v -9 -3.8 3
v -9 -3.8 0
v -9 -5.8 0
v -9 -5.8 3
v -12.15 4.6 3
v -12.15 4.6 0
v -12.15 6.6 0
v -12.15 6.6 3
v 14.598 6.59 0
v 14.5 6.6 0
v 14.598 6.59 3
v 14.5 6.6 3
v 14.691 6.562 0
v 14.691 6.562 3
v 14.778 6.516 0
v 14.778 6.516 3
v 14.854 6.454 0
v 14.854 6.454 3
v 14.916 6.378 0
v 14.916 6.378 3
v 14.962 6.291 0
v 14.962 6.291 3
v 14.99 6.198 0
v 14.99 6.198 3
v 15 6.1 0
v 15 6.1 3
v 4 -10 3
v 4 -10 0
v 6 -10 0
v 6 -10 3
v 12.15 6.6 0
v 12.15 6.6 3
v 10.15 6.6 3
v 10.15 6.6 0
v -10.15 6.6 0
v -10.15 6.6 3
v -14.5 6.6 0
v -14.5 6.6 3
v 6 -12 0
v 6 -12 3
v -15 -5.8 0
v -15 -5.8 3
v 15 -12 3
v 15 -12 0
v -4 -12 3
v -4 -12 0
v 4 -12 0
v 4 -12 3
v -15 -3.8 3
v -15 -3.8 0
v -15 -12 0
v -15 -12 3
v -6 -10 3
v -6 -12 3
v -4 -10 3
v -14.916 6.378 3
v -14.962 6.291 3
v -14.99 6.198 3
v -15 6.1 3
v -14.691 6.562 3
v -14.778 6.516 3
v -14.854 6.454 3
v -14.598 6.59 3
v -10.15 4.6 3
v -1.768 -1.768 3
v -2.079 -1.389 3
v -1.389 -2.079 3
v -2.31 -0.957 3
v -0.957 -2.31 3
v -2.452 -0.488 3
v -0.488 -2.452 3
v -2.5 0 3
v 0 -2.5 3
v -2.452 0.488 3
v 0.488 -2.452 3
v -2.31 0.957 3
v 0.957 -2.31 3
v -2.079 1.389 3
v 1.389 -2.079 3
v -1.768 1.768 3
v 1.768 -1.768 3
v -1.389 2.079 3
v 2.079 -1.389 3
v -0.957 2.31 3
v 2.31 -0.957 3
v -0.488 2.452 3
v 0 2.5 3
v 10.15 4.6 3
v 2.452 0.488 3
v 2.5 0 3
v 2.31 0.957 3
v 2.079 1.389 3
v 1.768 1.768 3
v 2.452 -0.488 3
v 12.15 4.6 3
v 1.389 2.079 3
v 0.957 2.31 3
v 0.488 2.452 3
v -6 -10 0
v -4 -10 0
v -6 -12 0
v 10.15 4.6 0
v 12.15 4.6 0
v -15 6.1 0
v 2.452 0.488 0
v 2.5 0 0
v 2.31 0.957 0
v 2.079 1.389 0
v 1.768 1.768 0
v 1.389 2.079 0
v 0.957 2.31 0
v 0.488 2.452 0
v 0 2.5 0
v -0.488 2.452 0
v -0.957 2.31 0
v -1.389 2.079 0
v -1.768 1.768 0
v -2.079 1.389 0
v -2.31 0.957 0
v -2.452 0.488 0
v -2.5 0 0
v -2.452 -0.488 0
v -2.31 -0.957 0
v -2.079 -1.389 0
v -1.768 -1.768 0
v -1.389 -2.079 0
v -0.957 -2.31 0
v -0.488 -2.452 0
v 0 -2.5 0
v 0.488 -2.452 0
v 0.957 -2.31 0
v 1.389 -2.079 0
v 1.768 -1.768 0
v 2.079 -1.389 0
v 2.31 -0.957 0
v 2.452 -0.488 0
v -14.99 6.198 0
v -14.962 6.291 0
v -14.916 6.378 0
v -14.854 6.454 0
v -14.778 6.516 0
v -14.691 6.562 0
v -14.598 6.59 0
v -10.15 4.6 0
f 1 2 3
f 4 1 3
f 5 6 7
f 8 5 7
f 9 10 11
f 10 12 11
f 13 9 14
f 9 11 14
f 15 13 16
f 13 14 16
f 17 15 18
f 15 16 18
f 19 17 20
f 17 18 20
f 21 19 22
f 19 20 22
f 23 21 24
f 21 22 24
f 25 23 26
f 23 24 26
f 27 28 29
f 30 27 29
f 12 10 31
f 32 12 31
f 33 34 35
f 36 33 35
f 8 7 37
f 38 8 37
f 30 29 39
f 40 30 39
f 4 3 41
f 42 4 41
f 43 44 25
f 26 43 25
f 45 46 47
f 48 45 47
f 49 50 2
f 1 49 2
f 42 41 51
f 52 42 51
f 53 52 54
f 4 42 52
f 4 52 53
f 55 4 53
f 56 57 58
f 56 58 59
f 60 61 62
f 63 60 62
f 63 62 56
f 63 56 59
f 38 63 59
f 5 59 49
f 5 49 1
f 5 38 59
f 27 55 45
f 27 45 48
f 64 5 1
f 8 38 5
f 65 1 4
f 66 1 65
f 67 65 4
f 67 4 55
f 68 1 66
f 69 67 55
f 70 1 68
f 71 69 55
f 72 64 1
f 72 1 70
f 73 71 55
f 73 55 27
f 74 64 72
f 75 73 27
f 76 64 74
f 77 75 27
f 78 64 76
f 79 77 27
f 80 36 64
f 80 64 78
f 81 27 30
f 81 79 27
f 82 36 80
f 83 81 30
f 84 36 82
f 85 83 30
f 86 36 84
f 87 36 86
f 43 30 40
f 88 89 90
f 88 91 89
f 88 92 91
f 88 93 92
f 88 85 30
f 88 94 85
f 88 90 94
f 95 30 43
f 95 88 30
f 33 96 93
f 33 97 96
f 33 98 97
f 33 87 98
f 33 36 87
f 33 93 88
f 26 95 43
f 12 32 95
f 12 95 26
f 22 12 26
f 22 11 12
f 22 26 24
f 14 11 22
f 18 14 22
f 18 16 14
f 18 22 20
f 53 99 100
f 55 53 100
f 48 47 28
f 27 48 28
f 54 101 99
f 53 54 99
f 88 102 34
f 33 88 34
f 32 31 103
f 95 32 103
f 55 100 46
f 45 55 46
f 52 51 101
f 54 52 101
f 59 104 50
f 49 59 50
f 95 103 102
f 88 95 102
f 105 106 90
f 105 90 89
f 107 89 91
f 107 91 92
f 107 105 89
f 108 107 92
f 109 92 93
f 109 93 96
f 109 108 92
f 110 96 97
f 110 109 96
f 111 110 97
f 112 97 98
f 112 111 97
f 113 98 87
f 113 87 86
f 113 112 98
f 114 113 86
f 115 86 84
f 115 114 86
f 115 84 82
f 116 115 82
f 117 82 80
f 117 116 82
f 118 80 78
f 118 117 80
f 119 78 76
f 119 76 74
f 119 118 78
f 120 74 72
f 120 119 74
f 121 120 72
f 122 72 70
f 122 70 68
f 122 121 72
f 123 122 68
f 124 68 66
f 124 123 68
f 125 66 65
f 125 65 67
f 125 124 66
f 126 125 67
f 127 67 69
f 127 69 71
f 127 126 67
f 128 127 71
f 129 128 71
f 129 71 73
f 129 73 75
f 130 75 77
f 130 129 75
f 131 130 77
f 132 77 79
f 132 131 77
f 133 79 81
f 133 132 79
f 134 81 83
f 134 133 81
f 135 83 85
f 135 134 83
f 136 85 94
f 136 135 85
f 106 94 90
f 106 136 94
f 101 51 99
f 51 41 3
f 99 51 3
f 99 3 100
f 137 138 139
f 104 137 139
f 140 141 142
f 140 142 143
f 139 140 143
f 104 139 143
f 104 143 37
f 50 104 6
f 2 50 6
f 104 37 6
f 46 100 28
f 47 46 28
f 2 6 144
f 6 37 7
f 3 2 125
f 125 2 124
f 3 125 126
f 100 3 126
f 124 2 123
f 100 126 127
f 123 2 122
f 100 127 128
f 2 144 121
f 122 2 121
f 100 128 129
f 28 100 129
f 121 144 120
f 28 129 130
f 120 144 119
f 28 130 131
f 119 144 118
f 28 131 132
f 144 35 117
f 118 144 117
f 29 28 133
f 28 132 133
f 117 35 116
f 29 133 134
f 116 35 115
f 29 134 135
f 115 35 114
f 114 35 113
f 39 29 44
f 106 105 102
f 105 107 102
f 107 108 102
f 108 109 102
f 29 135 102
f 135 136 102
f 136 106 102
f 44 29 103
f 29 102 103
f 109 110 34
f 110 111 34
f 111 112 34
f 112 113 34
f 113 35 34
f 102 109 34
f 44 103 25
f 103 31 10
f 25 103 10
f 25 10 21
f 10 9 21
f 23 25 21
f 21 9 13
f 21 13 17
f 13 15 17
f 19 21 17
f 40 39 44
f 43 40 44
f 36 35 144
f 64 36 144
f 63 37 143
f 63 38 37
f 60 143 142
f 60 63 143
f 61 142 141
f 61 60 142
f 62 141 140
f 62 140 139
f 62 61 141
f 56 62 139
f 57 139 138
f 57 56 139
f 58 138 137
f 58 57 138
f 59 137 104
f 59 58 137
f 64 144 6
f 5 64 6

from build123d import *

# Parameters (mm, degrees)
SKETCH_1_R      = 2.5
EXTRUDE_1_DEPTH = 3
FILLET_1_R      = 0.5


with BuildPart() as part:
    # ｽｹｯﾁ1 → ﾎﾞｽ - 押し出し1 (new body)
    with BuildSketch(Plane.XY):
        Polygon((-12.15, 6.6), (-15, 6.6), (-15, -3.8), (-9, -3.8), (-9, -5.8), (-15, -5.8), (-15, -12), (-6, -12), (-6, -10), (-4, -10), (-4, -12), (4, -12), (4, -10), (6, -10), (6, -12), (15, -12), (15, 6.6), (12.15, 6.6), (12.15, 4.6), (10.15, 4.6), (10.15, 6.6), (-10.15, 6.6), (-10.15, 4.6), (-12.15, 4.6), align=None)
        Circle(SKETCH_1_R, mode=Mode.SUBTRACT)
    extrude(amount=EXTRUDE_1_DEPTH)

    # ﾌｨﾚｯﾄ1
    fillet_1_edges = [part.edges().sort_by_distance(p)[0] for p in [
        (-15, 6.6, 1.5),
        (15, 6.6, 1.5),
    ]]
    fillet(fillet_1_edges, radius=FILLET_1_R)


solid = part.part
